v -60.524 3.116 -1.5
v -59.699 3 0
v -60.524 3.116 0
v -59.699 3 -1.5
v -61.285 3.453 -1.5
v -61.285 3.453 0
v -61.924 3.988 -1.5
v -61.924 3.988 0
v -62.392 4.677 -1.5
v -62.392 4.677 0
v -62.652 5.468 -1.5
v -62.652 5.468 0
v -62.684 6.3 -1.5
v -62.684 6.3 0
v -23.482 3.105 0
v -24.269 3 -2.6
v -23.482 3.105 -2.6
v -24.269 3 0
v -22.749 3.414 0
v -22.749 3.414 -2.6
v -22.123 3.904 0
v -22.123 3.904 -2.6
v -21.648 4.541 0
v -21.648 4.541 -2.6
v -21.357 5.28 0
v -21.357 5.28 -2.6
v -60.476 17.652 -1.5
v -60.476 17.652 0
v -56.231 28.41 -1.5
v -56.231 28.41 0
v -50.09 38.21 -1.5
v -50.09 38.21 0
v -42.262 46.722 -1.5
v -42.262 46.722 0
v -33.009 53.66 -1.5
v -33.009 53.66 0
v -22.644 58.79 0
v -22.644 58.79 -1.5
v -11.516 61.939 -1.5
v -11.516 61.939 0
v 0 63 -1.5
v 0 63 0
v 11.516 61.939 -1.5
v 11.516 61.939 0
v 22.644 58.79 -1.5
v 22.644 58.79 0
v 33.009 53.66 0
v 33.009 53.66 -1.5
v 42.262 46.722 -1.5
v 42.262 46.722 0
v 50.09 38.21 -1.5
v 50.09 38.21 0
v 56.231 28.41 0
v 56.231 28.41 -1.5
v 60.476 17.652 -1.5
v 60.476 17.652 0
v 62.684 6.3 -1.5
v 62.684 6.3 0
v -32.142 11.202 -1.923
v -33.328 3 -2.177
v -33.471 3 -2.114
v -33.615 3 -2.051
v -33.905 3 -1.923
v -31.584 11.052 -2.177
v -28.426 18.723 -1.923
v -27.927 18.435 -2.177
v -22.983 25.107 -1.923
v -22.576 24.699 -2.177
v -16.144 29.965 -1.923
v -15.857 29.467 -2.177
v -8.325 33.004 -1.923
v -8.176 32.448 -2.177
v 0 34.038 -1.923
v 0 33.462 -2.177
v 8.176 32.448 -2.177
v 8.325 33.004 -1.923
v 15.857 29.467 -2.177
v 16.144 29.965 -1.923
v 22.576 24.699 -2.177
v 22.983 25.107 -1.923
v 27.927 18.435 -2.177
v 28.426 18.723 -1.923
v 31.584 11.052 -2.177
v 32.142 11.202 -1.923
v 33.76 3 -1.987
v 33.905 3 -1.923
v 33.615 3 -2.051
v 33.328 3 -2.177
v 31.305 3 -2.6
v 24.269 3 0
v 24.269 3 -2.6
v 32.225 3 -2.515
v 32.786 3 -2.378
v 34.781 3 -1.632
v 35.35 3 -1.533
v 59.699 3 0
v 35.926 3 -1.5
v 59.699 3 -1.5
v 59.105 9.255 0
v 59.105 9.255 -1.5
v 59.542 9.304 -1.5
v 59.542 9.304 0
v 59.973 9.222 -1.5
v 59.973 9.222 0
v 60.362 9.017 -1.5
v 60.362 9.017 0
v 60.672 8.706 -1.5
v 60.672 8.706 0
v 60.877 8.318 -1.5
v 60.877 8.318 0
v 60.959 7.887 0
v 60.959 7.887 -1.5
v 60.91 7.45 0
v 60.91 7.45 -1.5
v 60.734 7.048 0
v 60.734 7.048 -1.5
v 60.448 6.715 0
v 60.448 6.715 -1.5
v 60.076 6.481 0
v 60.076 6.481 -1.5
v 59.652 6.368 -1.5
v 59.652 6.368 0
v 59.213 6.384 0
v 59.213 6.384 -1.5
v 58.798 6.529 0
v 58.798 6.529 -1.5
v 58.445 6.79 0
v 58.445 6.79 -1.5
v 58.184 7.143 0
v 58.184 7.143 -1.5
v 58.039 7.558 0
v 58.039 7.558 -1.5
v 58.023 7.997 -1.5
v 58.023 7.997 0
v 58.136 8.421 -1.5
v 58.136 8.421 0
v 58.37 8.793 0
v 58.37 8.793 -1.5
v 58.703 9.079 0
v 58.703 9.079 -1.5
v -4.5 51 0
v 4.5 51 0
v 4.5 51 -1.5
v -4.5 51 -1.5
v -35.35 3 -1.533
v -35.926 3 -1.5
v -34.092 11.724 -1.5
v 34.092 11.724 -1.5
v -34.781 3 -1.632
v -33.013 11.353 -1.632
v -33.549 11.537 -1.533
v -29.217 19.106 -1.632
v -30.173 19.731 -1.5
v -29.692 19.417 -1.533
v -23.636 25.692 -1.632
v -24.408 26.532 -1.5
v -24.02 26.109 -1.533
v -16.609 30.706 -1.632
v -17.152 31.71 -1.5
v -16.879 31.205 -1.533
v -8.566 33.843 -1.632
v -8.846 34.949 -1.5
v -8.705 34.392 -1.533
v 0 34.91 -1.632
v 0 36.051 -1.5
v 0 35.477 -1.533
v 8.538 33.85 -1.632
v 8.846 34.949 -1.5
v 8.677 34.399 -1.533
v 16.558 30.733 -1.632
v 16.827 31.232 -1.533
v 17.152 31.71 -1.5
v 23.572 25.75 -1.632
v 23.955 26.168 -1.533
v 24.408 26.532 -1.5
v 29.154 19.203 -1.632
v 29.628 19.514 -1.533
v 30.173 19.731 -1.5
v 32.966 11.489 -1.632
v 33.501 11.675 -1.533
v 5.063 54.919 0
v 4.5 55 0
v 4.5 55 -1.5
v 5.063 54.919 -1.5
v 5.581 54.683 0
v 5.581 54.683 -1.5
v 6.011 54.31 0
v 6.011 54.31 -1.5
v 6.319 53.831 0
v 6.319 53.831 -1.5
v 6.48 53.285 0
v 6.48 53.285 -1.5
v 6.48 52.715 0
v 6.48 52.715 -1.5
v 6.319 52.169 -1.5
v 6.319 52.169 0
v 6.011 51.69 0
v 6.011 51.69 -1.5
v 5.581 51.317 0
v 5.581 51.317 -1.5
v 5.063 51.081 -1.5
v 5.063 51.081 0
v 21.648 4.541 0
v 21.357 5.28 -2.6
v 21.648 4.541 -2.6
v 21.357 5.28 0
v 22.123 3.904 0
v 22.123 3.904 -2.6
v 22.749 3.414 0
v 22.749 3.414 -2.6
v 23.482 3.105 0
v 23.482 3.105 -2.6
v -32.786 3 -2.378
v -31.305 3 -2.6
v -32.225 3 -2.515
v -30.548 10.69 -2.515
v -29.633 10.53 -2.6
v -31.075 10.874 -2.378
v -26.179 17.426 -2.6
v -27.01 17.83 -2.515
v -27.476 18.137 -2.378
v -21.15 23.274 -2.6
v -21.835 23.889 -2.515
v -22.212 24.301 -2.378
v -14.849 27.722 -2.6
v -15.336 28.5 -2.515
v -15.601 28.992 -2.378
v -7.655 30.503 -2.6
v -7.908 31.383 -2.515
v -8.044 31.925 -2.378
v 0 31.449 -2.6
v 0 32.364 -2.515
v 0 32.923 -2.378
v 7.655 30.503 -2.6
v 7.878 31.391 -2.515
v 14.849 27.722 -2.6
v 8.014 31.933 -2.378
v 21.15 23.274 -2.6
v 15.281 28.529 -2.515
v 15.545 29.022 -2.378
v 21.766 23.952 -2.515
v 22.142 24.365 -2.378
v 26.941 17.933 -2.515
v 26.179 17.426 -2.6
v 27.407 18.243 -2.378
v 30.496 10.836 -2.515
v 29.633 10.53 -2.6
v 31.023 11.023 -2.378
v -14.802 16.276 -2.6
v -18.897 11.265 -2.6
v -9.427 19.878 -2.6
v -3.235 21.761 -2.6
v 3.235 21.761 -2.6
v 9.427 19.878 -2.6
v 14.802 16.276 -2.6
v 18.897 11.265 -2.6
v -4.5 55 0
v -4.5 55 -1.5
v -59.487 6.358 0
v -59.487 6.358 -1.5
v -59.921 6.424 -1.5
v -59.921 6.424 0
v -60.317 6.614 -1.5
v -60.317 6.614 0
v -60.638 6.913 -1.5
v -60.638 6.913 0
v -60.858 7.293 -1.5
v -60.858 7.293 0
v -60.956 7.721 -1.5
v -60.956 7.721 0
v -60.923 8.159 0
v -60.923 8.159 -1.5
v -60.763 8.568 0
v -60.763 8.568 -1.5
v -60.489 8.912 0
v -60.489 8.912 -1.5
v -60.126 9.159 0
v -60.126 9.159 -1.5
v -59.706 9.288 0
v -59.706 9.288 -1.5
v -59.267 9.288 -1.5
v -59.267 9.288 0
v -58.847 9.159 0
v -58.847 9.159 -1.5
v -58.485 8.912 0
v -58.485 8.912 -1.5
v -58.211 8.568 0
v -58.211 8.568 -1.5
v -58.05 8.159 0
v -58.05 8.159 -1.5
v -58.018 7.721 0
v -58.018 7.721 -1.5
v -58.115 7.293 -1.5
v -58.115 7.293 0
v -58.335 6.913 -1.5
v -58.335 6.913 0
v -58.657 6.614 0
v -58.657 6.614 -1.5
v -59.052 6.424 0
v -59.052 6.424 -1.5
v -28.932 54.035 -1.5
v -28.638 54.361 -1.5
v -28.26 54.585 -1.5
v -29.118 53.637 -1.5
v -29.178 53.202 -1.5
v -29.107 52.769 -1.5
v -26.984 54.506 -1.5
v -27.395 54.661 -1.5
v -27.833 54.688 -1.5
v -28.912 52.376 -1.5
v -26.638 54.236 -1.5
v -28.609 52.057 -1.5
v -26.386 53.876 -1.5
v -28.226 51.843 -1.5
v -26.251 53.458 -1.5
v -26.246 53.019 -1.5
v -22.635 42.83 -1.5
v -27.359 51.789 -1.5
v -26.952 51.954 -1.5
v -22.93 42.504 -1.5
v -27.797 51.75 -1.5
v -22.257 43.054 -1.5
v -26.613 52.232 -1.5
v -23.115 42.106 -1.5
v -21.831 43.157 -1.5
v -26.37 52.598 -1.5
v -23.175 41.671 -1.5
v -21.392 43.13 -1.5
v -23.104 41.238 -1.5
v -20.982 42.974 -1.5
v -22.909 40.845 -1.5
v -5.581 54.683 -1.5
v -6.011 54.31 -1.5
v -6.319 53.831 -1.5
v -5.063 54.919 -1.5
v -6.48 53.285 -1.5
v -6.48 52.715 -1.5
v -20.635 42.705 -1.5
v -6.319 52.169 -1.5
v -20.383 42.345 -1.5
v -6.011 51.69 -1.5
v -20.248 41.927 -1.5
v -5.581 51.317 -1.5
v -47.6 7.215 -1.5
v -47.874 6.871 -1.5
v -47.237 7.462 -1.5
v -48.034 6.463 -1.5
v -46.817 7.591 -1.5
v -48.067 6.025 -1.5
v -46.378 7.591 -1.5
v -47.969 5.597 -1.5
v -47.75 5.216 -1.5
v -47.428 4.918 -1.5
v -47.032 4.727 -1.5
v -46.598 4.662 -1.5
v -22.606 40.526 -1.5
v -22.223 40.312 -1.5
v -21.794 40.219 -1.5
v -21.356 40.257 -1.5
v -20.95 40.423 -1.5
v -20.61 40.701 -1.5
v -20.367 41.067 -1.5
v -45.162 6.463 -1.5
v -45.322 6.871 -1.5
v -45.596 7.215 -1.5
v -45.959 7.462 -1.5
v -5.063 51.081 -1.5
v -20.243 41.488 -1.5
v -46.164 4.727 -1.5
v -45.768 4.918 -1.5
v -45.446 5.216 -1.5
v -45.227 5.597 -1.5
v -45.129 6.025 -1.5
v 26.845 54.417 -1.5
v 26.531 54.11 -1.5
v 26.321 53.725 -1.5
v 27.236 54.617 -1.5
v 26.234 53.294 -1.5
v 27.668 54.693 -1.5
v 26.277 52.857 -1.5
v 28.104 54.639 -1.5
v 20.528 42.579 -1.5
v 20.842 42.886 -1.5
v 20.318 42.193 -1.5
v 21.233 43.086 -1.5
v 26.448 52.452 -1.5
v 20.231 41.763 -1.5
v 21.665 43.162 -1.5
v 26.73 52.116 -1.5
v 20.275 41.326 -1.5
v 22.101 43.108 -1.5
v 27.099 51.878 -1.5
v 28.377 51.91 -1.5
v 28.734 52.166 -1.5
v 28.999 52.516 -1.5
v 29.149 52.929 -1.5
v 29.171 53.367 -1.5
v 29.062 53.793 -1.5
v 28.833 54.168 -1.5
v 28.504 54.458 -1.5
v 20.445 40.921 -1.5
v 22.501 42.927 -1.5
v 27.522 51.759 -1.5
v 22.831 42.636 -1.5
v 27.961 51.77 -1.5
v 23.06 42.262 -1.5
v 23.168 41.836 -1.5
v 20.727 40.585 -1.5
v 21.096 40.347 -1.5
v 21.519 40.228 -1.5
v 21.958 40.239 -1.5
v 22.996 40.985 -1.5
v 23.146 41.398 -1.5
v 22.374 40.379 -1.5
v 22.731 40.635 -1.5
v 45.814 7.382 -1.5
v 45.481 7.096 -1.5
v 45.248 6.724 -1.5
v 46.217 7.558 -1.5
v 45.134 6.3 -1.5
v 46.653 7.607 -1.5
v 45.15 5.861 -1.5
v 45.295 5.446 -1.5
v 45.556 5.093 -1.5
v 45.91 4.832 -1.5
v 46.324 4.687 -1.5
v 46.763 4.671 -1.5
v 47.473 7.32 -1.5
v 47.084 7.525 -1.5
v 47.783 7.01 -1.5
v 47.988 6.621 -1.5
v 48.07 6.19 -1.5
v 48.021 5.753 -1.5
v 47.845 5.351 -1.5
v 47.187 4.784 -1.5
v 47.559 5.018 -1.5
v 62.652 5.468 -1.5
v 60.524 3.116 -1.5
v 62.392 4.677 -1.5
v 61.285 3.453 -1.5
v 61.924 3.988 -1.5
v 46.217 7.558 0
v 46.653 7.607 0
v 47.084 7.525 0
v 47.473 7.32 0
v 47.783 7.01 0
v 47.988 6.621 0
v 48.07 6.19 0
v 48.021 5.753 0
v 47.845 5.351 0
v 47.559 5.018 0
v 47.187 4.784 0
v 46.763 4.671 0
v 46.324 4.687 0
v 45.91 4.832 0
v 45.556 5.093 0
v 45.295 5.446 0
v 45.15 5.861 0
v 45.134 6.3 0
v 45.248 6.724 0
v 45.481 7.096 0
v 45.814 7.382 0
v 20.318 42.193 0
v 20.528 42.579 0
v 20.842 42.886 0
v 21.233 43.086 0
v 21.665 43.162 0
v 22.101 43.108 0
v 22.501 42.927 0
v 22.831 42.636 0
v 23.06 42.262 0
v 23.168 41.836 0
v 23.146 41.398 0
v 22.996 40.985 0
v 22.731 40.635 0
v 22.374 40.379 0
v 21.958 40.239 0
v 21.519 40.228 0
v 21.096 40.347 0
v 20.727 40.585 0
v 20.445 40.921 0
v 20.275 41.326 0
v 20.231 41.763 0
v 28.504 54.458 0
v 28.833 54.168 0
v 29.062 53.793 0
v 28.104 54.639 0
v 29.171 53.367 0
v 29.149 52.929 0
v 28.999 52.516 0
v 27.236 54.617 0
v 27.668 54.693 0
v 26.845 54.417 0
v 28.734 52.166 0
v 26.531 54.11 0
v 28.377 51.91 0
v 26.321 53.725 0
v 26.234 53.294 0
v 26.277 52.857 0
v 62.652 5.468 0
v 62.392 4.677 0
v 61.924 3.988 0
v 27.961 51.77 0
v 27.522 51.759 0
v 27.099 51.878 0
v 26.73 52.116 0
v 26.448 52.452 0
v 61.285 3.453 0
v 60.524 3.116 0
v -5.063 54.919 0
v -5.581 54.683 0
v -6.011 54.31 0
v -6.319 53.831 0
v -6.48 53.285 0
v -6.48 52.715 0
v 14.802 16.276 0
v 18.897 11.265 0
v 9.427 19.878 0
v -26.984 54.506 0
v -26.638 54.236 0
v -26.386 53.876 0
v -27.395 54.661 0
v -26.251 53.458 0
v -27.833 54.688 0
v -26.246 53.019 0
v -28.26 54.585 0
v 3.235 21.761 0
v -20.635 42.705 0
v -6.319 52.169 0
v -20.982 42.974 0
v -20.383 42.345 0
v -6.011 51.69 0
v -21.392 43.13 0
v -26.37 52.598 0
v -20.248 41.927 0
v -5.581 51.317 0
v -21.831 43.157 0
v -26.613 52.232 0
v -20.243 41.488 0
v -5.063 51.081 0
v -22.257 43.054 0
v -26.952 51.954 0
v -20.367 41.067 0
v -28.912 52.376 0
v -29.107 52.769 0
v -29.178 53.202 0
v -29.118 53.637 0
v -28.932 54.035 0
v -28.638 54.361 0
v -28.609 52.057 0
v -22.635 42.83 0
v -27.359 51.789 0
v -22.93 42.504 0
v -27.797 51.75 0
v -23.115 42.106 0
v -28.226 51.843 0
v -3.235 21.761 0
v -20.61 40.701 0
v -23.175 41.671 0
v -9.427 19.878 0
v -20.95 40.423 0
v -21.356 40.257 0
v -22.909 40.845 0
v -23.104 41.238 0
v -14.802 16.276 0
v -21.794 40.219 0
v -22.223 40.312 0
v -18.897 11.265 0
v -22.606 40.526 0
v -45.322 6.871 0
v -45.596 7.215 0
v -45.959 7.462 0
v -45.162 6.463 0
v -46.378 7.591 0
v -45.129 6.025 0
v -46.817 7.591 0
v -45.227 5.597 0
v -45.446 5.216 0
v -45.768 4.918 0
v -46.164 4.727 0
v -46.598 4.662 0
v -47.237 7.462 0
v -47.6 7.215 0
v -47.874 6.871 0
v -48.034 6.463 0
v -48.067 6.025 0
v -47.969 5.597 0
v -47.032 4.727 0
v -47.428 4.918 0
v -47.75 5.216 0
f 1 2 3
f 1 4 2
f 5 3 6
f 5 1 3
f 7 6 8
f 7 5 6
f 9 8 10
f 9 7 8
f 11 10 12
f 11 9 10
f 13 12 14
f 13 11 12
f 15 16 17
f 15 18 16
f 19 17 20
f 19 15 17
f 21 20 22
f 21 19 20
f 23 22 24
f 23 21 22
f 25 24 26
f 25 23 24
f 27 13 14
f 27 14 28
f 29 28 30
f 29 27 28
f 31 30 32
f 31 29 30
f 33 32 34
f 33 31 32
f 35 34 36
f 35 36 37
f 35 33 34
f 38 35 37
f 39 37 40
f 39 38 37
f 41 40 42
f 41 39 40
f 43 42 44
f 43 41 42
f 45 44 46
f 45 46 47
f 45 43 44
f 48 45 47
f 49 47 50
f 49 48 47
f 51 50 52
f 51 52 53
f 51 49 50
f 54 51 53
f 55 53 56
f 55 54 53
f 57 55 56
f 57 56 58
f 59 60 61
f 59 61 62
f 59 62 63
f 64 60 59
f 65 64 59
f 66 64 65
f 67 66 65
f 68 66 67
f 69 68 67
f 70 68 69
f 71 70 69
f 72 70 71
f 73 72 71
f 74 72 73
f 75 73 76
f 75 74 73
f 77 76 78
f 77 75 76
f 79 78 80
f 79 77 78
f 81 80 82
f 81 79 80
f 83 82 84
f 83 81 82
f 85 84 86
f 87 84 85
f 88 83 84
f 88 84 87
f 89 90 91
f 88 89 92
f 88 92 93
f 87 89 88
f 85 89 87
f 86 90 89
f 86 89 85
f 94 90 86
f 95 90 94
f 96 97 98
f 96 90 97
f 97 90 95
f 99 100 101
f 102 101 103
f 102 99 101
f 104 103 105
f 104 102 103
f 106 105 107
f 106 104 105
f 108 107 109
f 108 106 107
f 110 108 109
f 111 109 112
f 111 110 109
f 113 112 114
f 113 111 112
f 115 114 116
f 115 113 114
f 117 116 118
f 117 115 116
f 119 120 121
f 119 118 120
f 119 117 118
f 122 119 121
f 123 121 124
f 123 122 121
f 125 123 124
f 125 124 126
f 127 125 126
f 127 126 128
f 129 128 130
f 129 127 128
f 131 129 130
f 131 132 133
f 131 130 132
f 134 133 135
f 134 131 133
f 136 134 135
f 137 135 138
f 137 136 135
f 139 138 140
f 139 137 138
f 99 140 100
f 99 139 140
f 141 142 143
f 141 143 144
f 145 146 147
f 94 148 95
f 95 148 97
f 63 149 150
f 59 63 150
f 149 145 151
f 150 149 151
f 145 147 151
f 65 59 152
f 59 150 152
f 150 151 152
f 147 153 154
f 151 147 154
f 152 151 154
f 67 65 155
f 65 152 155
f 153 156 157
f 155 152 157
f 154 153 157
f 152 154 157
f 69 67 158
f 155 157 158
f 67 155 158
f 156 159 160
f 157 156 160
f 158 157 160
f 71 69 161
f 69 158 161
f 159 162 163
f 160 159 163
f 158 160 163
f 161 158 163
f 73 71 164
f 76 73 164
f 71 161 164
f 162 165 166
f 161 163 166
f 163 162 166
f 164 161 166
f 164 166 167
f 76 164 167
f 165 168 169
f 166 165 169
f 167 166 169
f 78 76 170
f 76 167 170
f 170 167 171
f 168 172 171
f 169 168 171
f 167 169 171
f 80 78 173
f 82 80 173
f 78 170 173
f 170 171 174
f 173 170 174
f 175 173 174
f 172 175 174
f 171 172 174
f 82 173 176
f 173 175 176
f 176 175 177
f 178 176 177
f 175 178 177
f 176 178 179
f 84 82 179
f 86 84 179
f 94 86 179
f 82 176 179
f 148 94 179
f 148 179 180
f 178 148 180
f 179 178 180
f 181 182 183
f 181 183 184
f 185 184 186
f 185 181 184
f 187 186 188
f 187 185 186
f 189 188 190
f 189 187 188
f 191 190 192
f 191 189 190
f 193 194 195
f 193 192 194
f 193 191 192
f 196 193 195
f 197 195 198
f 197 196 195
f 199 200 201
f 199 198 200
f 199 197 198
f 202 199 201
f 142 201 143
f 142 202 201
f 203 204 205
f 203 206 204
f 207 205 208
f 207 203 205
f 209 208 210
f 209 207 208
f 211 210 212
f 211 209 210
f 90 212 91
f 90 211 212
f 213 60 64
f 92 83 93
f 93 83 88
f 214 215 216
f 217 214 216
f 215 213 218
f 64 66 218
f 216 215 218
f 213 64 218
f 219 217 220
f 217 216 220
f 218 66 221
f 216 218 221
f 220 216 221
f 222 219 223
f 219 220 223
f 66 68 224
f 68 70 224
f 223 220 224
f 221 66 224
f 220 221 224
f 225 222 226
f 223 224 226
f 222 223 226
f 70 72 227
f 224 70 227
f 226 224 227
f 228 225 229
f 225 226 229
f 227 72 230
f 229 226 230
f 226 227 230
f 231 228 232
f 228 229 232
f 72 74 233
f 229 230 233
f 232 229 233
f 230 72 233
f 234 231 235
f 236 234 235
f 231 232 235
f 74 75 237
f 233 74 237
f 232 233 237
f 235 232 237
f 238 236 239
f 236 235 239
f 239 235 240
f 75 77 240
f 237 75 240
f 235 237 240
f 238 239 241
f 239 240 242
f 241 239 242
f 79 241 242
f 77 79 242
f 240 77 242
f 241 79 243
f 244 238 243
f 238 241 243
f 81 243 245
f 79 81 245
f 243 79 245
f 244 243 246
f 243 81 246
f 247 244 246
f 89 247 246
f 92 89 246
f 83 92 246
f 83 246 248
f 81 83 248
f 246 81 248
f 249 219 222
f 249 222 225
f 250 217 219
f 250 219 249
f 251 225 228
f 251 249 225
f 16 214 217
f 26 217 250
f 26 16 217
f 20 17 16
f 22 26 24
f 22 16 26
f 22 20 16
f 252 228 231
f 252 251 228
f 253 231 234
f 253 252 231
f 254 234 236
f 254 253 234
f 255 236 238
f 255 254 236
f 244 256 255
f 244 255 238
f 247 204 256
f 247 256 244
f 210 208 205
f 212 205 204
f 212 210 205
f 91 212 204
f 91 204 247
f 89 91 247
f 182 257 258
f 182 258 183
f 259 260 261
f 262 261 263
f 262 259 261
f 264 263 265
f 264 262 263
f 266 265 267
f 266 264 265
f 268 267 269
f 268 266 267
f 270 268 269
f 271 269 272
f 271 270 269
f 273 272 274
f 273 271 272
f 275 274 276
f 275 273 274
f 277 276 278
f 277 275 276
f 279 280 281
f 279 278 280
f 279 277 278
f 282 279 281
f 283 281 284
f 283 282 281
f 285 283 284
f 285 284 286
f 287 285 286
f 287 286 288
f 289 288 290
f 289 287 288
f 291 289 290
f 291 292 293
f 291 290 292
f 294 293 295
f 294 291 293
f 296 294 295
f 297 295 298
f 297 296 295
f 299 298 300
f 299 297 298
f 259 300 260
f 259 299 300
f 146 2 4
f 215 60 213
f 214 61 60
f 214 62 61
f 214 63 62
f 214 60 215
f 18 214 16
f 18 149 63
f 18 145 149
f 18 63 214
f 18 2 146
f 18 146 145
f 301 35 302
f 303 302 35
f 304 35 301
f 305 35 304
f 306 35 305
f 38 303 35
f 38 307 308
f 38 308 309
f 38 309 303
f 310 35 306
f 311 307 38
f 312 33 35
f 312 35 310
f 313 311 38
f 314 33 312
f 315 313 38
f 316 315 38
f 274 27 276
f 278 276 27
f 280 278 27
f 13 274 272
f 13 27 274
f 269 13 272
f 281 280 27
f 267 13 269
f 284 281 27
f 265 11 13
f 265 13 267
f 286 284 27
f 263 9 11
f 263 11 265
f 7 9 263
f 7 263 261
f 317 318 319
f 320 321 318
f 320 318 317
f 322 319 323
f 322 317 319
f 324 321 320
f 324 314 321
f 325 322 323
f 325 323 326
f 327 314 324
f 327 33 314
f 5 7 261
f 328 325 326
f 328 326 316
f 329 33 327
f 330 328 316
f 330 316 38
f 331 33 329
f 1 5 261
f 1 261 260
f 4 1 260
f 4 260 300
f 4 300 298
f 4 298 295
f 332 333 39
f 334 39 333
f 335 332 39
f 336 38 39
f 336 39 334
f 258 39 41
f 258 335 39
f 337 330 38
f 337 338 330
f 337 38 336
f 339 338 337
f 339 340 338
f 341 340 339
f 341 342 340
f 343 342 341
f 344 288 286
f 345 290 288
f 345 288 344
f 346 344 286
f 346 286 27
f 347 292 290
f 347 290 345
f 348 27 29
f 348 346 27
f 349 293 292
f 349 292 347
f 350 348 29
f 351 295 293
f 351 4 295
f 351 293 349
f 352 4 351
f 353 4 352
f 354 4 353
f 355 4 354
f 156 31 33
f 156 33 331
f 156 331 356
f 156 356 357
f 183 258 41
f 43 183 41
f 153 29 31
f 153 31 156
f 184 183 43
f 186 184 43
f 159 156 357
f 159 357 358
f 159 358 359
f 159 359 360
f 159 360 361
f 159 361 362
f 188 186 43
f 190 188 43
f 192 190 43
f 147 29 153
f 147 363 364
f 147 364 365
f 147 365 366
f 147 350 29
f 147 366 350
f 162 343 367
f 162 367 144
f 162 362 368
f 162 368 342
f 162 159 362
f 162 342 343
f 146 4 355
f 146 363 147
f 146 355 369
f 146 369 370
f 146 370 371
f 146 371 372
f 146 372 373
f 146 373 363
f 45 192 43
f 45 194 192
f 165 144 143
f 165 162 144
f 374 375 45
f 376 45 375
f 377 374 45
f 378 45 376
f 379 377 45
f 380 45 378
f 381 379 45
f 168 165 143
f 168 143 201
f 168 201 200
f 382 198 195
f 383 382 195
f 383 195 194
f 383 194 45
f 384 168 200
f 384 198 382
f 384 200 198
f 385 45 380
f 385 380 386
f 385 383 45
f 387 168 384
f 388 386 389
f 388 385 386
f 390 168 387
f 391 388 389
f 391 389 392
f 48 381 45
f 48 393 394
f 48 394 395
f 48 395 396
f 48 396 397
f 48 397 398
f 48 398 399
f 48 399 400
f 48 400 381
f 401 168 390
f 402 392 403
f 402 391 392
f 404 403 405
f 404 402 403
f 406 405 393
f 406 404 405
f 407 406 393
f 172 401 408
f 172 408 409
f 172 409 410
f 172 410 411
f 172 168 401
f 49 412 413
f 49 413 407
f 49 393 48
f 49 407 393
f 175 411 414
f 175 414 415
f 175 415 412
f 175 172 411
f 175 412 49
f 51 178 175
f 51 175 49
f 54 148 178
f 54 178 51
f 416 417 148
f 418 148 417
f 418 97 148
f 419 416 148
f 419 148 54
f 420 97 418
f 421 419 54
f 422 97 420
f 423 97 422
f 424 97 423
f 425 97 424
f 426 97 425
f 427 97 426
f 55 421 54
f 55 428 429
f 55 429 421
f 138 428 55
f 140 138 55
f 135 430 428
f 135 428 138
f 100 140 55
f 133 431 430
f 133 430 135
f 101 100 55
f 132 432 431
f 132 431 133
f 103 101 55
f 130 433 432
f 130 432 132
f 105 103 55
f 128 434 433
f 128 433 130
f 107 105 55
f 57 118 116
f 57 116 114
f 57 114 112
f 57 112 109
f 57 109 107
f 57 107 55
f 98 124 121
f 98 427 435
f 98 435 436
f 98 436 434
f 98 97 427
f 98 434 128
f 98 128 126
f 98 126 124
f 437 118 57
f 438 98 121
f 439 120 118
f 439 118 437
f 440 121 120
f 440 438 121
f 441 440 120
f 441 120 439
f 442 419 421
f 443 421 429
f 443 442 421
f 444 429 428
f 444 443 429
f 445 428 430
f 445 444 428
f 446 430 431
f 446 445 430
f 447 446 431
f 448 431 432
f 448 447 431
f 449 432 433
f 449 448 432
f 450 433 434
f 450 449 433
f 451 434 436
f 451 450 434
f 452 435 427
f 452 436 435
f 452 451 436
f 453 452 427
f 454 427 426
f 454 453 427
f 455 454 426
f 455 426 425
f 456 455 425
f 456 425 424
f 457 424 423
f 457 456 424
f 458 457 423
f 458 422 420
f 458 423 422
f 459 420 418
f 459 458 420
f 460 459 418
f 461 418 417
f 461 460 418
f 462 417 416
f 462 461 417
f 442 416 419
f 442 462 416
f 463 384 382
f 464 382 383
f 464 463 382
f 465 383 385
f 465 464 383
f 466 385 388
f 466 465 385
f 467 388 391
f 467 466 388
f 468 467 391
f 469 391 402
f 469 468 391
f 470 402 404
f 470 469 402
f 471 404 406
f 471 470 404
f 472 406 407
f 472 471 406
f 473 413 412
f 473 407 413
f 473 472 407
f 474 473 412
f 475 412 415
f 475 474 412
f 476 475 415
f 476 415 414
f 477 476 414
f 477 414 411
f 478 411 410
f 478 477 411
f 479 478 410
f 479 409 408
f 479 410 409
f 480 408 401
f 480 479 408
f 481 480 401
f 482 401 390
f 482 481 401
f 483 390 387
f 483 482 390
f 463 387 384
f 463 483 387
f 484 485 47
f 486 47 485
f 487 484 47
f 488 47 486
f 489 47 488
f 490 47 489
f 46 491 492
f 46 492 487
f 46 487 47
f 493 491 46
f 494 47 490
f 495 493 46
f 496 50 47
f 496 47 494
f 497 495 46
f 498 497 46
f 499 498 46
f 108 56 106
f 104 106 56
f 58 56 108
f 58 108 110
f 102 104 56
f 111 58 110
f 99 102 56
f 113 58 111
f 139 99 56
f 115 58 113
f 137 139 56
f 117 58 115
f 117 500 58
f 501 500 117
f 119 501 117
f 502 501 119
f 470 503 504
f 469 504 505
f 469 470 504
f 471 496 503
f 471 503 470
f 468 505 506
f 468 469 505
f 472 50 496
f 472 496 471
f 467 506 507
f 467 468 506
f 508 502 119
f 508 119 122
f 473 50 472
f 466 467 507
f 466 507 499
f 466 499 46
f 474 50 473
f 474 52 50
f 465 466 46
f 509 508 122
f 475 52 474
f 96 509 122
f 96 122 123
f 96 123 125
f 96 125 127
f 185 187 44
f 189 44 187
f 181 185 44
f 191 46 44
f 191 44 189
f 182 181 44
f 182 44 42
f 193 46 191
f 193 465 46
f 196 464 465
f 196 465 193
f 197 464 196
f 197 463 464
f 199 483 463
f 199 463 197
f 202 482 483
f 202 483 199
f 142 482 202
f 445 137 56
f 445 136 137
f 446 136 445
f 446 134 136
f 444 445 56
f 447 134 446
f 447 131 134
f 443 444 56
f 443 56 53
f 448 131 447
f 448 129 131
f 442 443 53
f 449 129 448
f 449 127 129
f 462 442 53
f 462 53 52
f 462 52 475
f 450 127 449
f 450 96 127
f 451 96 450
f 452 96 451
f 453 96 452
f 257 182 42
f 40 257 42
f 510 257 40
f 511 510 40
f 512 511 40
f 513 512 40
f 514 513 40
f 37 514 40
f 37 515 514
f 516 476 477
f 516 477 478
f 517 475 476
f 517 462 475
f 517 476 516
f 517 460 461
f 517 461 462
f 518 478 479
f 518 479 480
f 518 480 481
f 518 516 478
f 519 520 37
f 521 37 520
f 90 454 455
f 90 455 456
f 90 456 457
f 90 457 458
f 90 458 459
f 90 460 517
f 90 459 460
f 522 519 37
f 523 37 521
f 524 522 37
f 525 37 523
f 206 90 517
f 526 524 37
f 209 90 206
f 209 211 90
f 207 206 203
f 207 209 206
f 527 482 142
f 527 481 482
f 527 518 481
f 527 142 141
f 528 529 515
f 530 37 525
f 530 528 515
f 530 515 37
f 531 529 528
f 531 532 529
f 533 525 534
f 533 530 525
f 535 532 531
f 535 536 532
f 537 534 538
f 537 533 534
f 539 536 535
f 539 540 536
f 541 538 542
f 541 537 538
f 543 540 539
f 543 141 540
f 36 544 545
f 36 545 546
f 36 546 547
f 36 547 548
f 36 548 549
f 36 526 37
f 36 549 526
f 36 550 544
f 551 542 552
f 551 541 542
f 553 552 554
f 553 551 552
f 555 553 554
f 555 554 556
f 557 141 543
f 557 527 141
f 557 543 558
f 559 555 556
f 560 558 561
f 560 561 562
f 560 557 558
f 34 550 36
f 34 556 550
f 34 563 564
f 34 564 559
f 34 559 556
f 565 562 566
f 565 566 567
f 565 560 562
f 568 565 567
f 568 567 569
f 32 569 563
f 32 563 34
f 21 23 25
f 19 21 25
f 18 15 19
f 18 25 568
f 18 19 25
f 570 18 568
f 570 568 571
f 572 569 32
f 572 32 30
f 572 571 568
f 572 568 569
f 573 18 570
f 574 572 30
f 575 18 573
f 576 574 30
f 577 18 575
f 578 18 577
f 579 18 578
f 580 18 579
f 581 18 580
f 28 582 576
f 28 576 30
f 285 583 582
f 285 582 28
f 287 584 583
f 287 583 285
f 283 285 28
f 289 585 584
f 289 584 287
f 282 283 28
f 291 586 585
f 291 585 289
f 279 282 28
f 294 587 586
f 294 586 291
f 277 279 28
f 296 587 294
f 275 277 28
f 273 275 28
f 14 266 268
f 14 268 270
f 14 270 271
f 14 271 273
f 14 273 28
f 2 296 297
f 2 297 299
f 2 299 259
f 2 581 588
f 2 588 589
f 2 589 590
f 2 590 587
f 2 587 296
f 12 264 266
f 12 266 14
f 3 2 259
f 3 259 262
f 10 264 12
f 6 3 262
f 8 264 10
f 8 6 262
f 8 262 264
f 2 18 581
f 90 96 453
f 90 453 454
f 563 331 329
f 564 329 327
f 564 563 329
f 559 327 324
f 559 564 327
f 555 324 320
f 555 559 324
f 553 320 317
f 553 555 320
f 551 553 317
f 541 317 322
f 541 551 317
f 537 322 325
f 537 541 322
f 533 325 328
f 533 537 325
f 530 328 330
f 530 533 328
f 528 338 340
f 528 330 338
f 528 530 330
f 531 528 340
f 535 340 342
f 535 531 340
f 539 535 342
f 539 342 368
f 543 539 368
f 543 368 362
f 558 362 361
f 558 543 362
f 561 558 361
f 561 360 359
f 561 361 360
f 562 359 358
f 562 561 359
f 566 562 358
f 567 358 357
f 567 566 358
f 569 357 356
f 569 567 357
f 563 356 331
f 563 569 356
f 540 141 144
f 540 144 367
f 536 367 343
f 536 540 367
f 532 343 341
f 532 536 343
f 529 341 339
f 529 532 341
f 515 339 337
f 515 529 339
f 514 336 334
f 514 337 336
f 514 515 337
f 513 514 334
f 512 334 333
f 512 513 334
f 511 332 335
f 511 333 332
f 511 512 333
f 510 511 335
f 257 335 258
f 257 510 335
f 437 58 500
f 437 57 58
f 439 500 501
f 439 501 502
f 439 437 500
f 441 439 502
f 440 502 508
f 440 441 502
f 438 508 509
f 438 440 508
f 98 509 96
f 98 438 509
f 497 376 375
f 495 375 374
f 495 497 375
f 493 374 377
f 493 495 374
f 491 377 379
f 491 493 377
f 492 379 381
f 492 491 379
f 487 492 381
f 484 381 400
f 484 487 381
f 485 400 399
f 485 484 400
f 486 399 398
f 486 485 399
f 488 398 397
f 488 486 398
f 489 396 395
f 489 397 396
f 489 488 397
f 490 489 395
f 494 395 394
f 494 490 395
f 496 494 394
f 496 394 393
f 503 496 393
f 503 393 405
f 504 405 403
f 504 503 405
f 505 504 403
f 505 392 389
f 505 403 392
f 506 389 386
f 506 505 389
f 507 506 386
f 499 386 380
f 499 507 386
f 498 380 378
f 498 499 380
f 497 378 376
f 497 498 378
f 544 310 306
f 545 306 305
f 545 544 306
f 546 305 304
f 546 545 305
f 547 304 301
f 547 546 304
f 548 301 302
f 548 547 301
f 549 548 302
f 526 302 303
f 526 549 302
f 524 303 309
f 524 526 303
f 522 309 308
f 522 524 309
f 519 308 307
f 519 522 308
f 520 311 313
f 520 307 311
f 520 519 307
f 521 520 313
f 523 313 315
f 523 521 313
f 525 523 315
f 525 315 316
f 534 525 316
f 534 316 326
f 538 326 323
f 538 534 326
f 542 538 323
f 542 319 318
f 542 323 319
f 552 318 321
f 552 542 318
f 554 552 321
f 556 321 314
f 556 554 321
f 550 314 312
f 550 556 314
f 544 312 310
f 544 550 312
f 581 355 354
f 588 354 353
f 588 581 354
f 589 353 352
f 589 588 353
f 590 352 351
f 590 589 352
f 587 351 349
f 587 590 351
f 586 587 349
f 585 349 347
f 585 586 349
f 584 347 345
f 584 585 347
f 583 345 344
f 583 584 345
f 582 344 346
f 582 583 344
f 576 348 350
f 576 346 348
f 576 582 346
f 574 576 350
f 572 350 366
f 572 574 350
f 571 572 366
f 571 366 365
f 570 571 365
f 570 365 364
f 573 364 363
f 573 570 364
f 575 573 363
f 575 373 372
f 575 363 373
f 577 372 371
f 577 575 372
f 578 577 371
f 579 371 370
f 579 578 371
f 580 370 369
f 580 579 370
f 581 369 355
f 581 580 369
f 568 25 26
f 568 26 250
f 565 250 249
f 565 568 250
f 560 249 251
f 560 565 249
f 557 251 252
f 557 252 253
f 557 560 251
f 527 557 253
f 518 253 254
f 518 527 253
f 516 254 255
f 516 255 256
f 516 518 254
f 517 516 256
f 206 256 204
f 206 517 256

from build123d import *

# Parameters (mm, degrees)
SKETCH2_W                      = 198.000030872
SKETCH2_H                      = 103.32125718
CUT_EXTRUDE1_DEPTH             = 3.6
FILLET1_R                      = 5
FILLET2_R                      = 3
F_4_CLEARANCE_HOLE1_AT_2_COUNT = 2
F_4_CLEARANCE_HOLE1_AT_2_PITCH = 13
CIRPATTERN1_COUNT              = 4
CIRPATTERN1_ANGLE              = 165
CUT_EXTRUDE2_DEPTH             = 3.6000001


with BuildPart() as part:
    # Sketch1 → Revolve1 (revolve)
    with BuildSketch(Plane(origin=(0, 0, 0), x_dir=(0, 0, -1), z_dir=(1, 0, 0)), mode=Mode.PRIVATE) as revolve1_sk:
        Polygon((0, 22), (0, 63), (1.5, 63), (1.5, 35), (2.6, 32.5), (2.6, 22), align=None)
    revolve(revolve1_sk.sketch.rotate(Axis((0, 0, 0), (0, 0, -1)), 90), axis=Axis((0, 0, 0), (0, 0, -1)))  # turned: the seam where the file's is

    # Sketch2 → Cut-Extrude1 (cut, through all)
    with BuildSketch(Plane.XY):
        with Locations((-0.69062002, -48.66062859)):
            Rectangle(SKETCH2_W, SKETCH2_H)
    extrude(amount=-CUT_EXTRUDE1_DEPTH, mode=Mode.SUBTRACT)

    # Fillet1
    fillet1_edges = [part.edges().sort_by_distance(p)[0] for p in [
        (0, 32.5, -2.6),
        (0, 35, -1.5),
    ]]
    fillet(fillet1_edges, radius=FILLET1_R)

    # Fillet2
    fillet2_edges = [part.edges().sort_by_distance(p)[0] for p in [
        (-21.794494718, 3, -1.3),
        (-62.92853089, 3, -0.75),
        (21.794494718, 3, -1.3),
        (62.92853089, 3, -0.75),
    ]]
    fillet(fillet2_edges, radius=FILLET2_R)

    # Sketch3 → #4 Clearance Hole1 (revolve, cut)
    with BuildSketch(Plane(origin=(-59.486691682, 7.831571533, 0), x_dir=(0, -1, 0), z_dir=(1, 0, 0))):
        Polygon((0, 0), (0, 136.775187864), (1.4732, 135.89), (1.4732, 0), align=None)
    f_4_clearance_hole1 = revolve(axis=Axis((-59.486691682, 7.831571533, 6.35), (0, 0, -1)), mode=Mode.SUBTRACT)

    # #4 Clearance Hole1 at 2: #4 Clearance Hole1 ×2
    with Locations(*[Vector(0.991444861, -0.130526192, 0) * (i * F_4_CLEARANCE_HOLE1_AT_2_PITCH) for i in range(1, F_4_CLEARANCE_HOLE1_AT_2_COUNT)]):
        add(f_4_clearance_hole1, mode=Mode.SUBTRACT)

    # CirPattern1: #4 Clearance Hole1 ×4 about axis
    cirpattern1_axis = Axis((0, 0, 0), (0, 0, -1))
    for i in range(1, CIRPATTERN1_COUNT):
        add(f_4_clearance_hole1.rotate(cirpattern1_axis, i * CIRPATTERN1_ANGLE / (CIRPATTERN1_COUNT - 1)), mode=Mode.SUBTRACT)

    # CirPattern1 copy 1 sketch → CirPattern1 copy 1 (revolve, cut)
    with BuildSketch(Plane(origin=(-21.702184822, 41.689509159, 0), x_dir=(-0.819152044, -0.573576436, 0), z_dir=(0.573576436, -0.819152044, 0))):
        Polygon((0, 0), (0, 136.775187864), (1.4732, 135.89), (1.4732, 0), align=None)
    revolve(axis=Axis((-21.702184822, 41.689509159, 6.35), (0, 0, -1)), mode=Mode.SUBTRACT)

    # CirPattern1 copy 2 sketch → CirPattern1 copy 2 (revolve, cut)
    with BuildSketch(Plane(origin=(21.702184822, 41.689509159, 0), x_dir=(-0.939692621, 0.342020143, 0), z_dir=(-0.342020143, -0.939692621, 0))):
        Polygon((0, 0), (0, 136.775187864), (1.4732, 135.89), (1.4732, 0), align=None)
    revolve(axis=Axis((21.702184822, 41.689509159, 6.35), (0, 0, -1)), mode=Mode.SUBTRACT)

    # CirPattern1 copy 3 sketch → CirPattern1 copy 3 (revolve, cut)
    with BuildSketch(Plane(origin=(46.597908485, 6.134731034, 0), x_dir=(-0.258819045, 0.965925826, 0), z_dir=(-0.965925826, -0.258819045, 0))):
        Polygon((0, 0), (0, 136.775187864), (1.4732, 135.89), (1.4732, 0), align=None)
    revolve(axis=Axis((46.597908485, 6.134731034, 6.35), (0, 0, -1)), mode=Mode.SUBTRACT)

    # Sketch5 → Cut-Extrude2 (cut, through all)
    with BuildSketch(Plane.XY):
        with BuildLine():
            Line((-4.5, 55), (4.5, 55))
            ThreePointArc((4.5, 55), (6.5, 53), (4.5, 51))
            Line((4.5, 51), (-4.5, 51))
            ThreePointArc((-4.5, 51), (-6.5, 53), (-4.5, 55))
        make_face()
    extrude(amount=-CUT_EXTRUDE2_DEPTH, mode=Mode.SUBTRACT)


solid = part.part
